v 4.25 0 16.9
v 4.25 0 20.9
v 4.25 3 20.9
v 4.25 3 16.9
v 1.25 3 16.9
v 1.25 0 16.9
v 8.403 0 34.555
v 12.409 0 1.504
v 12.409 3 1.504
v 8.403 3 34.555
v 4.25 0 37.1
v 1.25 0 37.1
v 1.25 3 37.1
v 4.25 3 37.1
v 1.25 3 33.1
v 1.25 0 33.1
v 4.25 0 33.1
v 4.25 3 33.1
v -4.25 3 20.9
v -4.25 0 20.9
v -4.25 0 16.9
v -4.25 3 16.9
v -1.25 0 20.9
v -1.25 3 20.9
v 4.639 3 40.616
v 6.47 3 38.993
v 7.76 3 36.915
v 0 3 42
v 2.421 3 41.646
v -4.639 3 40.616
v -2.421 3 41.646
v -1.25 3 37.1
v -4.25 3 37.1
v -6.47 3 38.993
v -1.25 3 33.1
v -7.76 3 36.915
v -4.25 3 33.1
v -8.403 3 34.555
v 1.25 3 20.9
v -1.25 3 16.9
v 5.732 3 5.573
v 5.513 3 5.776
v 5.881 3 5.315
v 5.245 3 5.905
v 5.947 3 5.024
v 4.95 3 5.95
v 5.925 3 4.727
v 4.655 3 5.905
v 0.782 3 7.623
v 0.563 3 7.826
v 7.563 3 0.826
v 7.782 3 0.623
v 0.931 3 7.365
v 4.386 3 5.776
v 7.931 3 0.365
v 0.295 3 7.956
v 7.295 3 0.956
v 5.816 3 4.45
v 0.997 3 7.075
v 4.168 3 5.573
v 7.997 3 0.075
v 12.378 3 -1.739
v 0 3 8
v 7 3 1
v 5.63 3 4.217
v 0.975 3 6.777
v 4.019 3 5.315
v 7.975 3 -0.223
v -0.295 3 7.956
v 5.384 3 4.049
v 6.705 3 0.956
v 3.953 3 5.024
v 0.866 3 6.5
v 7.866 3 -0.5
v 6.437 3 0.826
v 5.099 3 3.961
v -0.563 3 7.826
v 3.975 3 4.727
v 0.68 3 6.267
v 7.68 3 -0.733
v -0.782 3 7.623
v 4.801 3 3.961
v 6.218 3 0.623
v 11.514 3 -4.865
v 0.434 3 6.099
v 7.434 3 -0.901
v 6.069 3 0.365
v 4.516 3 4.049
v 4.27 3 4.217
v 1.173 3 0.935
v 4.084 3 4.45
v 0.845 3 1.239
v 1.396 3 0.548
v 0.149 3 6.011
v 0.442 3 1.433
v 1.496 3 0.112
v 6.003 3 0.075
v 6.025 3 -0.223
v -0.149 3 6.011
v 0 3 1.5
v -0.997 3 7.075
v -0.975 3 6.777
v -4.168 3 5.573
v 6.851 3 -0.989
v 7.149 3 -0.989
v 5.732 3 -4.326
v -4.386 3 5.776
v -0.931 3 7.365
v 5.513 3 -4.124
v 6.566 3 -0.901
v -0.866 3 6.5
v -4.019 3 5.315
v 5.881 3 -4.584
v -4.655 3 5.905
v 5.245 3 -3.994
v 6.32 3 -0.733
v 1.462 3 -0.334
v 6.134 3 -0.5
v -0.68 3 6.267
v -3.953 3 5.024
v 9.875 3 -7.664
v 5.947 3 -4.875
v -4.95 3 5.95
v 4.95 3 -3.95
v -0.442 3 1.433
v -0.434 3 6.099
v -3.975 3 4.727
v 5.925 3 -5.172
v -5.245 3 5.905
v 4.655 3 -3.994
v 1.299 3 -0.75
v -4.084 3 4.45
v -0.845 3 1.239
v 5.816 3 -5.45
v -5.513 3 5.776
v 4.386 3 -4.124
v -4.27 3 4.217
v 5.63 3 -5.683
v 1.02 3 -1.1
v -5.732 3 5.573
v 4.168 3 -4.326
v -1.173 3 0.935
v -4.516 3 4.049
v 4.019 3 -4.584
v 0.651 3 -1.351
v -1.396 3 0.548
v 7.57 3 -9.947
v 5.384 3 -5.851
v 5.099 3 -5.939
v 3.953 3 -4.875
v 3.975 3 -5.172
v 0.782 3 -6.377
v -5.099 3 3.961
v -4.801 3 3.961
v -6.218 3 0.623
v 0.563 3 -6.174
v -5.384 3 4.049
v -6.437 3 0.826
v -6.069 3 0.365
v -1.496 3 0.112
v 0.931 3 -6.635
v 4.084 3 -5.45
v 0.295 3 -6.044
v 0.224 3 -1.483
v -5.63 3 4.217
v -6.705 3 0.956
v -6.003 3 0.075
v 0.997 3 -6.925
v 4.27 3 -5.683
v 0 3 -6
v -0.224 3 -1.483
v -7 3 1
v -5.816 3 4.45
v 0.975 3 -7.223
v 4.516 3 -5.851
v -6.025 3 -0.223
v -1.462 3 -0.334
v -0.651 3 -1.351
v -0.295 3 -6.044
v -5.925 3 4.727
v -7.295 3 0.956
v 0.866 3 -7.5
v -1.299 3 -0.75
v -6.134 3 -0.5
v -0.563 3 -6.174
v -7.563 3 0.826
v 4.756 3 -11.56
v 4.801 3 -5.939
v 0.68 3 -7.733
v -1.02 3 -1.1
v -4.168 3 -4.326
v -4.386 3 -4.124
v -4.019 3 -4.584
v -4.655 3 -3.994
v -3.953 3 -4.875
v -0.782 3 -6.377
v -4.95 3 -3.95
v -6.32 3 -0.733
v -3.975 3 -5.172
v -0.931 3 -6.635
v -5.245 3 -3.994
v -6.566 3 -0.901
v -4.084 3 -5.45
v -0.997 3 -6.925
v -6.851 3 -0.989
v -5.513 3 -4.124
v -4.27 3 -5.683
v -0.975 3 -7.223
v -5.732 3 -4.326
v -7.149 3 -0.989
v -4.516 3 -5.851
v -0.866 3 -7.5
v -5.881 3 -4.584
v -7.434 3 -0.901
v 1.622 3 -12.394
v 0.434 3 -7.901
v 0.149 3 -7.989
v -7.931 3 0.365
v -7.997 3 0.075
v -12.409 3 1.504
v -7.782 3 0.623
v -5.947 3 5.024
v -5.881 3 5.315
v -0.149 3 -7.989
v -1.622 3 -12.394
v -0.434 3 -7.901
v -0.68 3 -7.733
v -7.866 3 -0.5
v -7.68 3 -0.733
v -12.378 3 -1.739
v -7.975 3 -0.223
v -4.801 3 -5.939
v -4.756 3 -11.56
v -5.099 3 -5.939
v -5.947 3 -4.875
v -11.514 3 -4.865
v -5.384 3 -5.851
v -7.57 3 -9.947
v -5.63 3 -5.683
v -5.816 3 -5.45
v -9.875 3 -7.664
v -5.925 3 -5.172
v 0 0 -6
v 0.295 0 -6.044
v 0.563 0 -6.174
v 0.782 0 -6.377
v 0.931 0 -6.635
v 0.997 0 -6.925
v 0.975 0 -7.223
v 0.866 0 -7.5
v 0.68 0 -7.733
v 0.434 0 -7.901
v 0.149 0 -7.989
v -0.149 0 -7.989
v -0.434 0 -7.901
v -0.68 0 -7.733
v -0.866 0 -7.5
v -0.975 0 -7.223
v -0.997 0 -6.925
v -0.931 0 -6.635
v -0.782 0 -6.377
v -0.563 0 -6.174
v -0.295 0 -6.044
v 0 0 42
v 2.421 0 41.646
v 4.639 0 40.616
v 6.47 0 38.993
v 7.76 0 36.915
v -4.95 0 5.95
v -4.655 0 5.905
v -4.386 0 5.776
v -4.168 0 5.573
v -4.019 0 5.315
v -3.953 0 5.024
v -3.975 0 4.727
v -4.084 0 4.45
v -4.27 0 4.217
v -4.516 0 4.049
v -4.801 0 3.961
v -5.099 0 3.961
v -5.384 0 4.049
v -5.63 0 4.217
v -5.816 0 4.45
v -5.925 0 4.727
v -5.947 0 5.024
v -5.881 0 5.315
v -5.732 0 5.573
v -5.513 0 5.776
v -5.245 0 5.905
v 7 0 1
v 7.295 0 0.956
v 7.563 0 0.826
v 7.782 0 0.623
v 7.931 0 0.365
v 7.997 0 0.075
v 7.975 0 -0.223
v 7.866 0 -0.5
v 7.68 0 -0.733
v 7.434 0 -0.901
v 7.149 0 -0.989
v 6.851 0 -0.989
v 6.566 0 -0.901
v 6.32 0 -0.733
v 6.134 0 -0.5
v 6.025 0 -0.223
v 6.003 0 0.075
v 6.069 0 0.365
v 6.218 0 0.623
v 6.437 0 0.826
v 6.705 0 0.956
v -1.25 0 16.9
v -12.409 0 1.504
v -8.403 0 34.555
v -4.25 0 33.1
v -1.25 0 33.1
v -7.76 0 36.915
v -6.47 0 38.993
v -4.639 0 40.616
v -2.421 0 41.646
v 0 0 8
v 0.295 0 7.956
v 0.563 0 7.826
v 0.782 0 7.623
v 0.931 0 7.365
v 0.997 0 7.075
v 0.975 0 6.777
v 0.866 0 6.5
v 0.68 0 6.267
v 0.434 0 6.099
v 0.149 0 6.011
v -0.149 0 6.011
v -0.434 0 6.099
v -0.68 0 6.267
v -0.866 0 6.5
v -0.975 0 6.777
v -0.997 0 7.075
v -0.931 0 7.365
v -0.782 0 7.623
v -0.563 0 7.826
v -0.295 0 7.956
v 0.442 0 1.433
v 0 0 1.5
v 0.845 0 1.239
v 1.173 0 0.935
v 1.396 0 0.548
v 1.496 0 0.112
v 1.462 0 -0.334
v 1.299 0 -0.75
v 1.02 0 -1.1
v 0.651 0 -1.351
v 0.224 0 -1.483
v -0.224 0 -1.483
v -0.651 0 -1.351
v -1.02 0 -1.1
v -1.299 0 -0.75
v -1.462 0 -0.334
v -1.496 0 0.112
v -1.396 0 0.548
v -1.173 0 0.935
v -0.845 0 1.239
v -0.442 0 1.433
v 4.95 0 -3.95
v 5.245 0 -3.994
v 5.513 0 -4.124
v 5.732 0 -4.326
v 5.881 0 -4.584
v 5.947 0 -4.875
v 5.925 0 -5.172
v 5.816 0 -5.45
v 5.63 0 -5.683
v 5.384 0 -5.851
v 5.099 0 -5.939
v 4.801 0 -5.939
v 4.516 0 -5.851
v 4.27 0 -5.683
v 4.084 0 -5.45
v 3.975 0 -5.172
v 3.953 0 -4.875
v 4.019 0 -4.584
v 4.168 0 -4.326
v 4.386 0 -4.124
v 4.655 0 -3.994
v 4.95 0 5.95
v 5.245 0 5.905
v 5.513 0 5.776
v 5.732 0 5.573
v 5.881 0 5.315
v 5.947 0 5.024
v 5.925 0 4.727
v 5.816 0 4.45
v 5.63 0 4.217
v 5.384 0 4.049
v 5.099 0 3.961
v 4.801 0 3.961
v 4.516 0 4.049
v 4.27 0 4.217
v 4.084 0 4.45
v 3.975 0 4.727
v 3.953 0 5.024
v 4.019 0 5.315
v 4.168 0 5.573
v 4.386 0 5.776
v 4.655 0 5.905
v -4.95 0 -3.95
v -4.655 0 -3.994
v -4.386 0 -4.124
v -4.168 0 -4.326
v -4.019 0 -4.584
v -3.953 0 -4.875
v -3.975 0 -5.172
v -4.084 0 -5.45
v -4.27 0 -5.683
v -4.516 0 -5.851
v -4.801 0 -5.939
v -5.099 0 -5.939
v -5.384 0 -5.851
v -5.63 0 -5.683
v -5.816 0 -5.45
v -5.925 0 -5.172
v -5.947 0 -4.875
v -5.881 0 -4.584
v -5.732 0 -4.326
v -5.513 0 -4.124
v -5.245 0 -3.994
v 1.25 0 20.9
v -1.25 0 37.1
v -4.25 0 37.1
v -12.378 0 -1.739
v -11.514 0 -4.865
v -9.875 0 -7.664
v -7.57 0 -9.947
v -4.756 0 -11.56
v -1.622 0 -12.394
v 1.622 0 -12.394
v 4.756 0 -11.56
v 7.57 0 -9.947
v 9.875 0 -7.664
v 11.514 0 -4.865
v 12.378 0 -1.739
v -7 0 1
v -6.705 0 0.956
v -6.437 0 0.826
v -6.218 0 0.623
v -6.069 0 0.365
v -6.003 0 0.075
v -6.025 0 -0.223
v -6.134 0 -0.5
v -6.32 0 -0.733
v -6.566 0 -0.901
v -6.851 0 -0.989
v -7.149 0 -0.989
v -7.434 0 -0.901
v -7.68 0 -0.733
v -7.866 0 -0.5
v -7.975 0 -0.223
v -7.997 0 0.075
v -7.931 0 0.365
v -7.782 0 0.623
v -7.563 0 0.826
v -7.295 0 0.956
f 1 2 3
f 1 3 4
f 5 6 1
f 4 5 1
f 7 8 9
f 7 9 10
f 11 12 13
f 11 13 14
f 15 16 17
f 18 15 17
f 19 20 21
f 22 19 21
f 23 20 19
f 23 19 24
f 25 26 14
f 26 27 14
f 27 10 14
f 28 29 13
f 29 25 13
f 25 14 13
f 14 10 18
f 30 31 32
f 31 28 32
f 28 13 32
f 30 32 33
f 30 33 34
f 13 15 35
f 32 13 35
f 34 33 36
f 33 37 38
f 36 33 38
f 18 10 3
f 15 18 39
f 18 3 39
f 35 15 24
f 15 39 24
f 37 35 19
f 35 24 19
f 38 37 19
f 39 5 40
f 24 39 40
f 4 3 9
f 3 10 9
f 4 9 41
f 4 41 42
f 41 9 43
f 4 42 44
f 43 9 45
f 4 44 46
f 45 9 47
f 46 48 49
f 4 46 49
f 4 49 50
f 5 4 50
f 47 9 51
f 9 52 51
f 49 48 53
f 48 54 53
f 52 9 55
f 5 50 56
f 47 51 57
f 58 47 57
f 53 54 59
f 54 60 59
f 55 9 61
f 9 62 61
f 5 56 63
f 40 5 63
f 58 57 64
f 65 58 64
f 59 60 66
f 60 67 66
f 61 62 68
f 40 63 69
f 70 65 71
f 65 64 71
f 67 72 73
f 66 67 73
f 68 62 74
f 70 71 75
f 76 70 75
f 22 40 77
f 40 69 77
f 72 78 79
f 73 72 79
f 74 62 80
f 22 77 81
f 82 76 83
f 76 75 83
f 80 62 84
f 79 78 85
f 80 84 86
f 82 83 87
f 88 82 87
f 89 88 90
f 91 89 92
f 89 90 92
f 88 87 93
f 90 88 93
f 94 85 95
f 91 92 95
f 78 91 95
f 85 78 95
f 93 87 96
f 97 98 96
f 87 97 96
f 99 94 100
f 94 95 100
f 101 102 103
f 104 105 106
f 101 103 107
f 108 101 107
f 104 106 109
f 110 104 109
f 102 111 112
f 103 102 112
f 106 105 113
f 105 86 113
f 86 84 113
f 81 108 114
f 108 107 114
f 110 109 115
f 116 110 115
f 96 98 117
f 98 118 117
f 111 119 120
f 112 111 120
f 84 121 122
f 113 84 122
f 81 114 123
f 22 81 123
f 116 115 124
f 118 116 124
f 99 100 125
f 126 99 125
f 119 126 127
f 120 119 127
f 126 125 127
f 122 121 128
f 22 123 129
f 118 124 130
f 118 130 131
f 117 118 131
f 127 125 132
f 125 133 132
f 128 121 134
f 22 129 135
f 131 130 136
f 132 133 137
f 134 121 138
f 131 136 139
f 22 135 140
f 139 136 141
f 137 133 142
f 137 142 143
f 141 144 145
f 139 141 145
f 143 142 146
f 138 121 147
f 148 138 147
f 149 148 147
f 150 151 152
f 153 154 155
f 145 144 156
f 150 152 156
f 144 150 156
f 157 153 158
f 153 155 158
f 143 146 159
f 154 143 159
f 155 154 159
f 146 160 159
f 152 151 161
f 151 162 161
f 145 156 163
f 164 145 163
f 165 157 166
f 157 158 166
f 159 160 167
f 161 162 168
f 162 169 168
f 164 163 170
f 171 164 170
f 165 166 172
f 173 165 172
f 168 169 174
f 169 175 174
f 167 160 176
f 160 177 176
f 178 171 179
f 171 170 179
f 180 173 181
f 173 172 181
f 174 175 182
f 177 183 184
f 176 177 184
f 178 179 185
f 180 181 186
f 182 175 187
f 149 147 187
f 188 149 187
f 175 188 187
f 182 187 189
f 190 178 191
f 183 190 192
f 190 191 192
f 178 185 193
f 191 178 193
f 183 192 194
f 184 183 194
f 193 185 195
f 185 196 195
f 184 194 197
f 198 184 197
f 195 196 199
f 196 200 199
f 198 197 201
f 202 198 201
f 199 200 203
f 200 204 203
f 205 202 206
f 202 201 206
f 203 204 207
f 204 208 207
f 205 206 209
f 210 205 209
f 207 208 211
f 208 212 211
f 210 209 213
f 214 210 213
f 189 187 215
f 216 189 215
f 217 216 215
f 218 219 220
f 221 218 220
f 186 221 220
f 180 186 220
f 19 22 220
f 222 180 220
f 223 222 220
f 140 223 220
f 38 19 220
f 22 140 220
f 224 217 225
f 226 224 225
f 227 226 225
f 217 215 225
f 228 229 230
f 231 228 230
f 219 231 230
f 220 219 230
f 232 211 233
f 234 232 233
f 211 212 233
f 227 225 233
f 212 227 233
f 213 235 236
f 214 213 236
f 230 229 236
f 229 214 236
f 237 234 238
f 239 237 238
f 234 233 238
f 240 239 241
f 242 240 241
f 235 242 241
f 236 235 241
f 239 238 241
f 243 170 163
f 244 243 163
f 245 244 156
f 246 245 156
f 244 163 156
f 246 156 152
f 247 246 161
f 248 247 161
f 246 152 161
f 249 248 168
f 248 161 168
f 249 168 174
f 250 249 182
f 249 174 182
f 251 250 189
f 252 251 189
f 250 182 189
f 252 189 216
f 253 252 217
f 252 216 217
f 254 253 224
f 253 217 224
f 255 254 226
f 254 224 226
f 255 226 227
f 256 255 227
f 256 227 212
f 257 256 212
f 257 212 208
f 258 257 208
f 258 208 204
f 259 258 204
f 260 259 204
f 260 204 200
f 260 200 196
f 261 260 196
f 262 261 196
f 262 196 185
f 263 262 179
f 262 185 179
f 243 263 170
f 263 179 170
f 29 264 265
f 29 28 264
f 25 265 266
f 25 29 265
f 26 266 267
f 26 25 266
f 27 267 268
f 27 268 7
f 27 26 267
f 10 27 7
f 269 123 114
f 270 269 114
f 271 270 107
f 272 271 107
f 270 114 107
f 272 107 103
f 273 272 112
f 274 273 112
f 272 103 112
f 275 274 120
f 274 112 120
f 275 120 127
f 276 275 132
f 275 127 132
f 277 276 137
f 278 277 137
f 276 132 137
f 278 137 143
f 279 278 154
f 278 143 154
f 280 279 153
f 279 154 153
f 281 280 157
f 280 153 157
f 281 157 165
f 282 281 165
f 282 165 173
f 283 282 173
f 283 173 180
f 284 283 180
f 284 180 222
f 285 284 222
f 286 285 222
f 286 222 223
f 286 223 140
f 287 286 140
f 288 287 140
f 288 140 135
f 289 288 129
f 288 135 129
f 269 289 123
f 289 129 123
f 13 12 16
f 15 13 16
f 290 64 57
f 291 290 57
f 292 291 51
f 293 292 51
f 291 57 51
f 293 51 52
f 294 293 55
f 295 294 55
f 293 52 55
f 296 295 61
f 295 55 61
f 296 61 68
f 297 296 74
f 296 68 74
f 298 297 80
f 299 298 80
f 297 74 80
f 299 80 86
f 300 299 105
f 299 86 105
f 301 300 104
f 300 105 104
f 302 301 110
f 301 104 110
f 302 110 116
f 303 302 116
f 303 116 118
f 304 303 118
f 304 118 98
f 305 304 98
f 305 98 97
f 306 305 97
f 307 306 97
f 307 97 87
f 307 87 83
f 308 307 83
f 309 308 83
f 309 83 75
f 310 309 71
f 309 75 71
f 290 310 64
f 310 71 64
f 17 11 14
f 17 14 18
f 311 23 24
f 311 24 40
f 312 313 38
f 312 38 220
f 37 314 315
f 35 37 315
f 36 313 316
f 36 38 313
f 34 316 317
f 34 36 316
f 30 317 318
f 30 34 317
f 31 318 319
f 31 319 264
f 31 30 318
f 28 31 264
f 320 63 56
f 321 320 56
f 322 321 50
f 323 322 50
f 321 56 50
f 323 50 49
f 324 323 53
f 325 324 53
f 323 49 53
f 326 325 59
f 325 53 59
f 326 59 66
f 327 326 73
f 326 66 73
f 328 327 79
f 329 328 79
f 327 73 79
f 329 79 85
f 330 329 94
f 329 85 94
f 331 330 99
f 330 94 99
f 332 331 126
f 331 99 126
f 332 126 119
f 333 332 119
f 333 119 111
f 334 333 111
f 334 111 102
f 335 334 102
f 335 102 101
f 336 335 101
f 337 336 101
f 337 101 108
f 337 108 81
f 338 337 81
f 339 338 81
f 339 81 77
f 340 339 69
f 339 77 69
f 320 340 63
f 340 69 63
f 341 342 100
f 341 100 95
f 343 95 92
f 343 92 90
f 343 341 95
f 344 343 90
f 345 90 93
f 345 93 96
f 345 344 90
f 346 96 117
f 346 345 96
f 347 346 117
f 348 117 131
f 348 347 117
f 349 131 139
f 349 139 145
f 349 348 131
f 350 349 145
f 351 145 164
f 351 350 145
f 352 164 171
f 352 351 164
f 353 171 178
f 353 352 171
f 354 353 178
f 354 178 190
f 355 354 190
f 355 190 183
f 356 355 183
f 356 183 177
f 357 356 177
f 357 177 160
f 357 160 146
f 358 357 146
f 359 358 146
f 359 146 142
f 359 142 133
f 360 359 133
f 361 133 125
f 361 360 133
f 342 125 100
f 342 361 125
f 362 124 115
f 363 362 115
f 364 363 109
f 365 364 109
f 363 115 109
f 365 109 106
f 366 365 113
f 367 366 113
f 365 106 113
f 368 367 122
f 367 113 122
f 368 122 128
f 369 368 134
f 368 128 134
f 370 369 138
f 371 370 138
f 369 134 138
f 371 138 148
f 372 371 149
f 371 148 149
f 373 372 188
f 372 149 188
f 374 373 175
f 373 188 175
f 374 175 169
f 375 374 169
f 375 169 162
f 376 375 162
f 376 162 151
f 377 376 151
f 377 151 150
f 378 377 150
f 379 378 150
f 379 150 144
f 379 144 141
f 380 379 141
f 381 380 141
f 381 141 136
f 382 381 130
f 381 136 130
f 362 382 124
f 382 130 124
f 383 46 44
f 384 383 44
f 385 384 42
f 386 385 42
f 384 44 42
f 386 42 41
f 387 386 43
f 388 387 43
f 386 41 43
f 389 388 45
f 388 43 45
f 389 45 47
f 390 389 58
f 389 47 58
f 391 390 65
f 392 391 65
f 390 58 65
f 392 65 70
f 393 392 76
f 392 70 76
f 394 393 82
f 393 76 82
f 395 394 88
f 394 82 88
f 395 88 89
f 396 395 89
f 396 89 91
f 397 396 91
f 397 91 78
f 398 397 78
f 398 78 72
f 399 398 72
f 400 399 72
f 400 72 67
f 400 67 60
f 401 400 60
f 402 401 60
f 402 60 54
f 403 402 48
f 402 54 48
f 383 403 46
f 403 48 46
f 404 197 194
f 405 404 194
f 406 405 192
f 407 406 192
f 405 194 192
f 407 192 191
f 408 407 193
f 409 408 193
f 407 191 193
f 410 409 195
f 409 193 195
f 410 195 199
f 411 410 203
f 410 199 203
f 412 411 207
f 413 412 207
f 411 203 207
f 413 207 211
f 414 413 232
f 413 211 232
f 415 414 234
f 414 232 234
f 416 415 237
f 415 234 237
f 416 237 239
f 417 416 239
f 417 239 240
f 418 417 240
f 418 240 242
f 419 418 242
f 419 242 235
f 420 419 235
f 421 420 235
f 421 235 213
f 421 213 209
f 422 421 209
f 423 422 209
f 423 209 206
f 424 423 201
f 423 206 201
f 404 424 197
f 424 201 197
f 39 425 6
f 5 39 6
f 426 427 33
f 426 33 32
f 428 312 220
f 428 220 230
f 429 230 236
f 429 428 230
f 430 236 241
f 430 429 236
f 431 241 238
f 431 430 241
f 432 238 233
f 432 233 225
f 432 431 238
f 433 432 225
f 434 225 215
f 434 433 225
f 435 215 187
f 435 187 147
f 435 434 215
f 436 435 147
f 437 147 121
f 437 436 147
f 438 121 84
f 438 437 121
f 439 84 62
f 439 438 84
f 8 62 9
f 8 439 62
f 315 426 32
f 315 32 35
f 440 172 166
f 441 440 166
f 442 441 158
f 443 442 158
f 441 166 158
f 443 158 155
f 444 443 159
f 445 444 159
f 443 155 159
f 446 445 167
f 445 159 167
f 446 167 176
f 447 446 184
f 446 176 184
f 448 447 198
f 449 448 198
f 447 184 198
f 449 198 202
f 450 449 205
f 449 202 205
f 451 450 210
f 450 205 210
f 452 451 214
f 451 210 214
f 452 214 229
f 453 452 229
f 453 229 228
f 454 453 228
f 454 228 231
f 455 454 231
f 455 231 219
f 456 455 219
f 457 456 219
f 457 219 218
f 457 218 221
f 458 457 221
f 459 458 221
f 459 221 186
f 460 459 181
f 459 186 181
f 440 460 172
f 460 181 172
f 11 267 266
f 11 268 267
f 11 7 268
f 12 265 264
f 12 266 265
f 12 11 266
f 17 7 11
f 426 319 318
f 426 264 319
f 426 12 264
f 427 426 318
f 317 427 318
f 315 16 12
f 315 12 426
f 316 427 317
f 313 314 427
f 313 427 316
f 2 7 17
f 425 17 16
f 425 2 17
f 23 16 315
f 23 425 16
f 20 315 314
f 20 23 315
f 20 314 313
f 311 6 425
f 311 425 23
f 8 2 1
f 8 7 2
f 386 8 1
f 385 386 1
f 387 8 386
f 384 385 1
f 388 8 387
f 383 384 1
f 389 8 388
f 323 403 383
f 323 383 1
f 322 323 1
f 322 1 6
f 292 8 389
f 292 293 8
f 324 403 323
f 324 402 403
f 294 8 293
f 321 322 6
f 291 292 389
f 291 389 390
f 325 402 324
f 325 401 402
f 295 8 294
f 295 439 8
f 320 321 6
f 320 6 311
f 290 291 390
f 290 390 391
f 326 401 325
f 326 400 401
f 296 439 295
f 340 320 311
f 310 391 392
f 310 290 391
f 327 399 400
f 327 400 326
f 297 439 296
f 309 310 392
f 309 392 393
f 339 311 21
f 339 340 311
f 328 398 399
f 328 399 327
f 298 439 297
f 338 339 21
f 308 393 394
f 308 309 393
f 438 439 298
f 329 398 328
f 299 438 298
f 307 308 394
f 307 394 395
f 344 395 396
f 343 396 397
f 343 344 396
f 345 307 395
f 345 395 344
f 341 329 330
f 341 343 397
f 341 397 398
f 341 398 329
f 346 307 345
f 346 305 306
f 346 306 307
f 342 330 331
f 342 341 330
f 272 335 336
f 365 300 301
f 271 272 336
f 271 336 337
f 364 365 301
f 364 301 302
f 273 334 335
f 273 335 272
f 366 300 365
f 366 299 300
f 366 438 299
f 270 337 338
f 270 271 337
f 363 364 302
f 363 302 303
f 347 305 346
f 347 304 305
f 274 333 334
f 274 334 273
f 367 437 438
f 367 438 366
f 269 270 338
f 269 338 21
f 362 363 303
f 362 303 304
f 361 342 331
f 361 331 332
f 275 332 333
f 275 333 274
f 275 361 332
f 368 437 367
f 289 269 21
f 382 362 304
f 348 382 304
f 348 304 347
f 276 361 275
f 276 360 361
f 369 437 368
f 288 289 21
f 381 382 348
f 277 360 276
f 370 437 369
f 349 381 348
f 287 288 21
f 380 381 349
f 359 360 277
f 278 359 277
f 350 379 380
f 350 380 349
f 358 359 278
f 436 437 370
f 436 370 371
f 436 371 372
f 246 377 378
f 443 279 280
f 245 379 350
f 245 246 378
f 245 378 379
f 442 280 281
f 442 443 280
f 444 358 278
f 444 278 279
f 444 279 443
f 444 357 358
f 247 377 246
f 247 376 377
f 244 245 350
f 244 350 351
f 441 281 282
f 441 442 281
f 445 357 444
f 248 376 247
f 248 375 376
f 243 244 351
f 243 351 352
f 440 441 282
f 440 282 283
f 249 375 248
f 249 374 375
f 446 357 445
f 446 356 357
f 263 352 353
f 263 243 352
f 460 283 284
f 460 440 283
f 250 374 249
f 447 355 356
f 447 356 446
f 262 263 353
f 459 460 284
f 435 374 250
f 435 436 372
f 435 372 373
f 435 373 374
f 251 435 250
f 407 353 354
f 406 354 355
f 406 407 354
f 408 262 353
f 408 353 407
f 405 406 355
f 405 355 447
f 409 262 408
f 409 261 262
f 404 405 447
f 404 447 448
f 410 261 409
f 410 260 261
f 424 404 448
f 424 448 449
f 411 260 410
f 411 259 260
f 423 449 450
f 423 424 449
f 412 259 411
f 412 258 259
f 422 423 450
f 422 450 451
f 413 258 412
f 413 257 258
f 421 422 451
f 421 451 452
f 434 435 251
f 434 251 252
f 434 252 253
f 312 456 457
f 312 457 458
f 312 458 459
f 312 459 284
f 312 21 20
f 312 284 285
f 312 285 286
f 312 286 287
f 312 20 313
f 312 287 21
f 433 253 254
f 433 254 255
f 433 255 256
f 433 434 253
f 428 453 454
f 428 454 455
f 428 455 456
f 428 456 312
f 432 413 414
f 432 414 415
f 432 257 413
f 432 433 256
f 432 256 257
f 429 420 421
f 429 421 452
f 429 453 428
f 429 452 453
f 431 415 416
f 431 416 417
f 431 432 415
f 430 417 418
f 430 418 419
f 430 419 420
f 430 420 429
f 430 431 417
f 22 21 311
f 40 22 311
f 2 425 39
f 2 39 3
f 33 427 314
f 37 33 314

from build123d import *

# Parameters (mm, degrees)
SKETCH1_R           = 1.5
SKETCH1_W           = 3
SKETCH1_H           = 4
BOSS_EXTRUDE2_DEPTH = 3
FILLET1_R           = 8.464107
SKETCH2_R           = 1
CUT_EXTRUDE1_DEPTH  = 3


with BuildPart() as part:
    # Sketch1 → Boss-Extrude2 (new body)
    with BuildSketch(Plane(origin=(0, 0, 0), x_dir=(1, 0, 0), z_dir=(0, 1, 0))):
        with BuildLine():
            Line((-7.5, -42), (-12.409150917, -1.504318289))
            ThreePointArc((-12.409150917, -1.504318289), (0, 12.5), (12.409150917, -1.504318289))
            Line((12.409150917, -1.504318289), (7.5, -42))
            Line((7.5, -42), (-7.5, -42))
        make_face()
        with Locations(Location((0, 0, 0), (0, 0, 270))):
            Circle(SKETCH1_R, mode=Mode.SUBTRACT)
        with Locations((2.75, -18.9)):
            Rectangle(SKETCH1_W, SKETCH1_H, mode=Mode.SUBTRACT)
        with Locations((-2.75, -18.9)):
            Rectangle(SKETCH1_W, SKETCH1_H, mode=Mode.SUBTRACT)
        with Locations((2.75, -35.1)):
            Rectangle(SKETCH1_W, SKETCH1_H, mode=Mode.SUBTRACT)
        with Locations((-2.75, -35.1)):
            Rectangle(SKETCH1_W, SKETCH1_H, mode=Mode.SUBTRACT)
    extrude(amount=BOSS_EXTRUDE2_DEPTH)

    # Fillet1
    fillet1_edges = [part.edges().sort_by_distance(p)[0] for p in [
        (7.5, 1.5, 42),
        (-7.5, 1.5, 42),
    ]]
    fillet(fillet1_edges, radius=FILLET1_R)

    # Sketch2 → Cut-Extrude1 (cut)
    with BuildSketch(Plane(origin=(0, 3, 0), x_dir=(1, 0, 0), z_dir=(0, 1, 0))):
        with Locations(Location((0, 7, 0), (0, 0, 270))):
            Circle(SKETCH2_R)
        with Locations(Location((4.949747468, 4.949747468, 0), (0, 0, 270))):
            Circle(SKETCH2_R)
        with Locations(Location((7, 0, 0), (0, 0, 270))):
            Circle(SKETCH2_R)
        with Locations(Location((4.949747468, -4.949747468, 0), (0, 0, 270))):
            Circle(SKETCH2_R)
        with Locations(Location((0, -7, 0), (0, 0, 270))):
            Circle(SKETCH2_R)
        with Locations(Location((-4.949747468, -4.949747468, 0), (0, 0, 270))):
            Circle(SKETCH2_R)
        with Locations(Location((-7, 0, 0), (0, 0, 270))):
            Circle(SKETCH2_R)
        with Locations(Location((-4.949747468, 4.949747468, 0), (0, 0, 270))):
            Circle(SKETCH2_R)
    extrude(amount=-CUT_EXTRUDE1_DEPTH, mode=Mode.SUBTRACT)


solid = part.part
